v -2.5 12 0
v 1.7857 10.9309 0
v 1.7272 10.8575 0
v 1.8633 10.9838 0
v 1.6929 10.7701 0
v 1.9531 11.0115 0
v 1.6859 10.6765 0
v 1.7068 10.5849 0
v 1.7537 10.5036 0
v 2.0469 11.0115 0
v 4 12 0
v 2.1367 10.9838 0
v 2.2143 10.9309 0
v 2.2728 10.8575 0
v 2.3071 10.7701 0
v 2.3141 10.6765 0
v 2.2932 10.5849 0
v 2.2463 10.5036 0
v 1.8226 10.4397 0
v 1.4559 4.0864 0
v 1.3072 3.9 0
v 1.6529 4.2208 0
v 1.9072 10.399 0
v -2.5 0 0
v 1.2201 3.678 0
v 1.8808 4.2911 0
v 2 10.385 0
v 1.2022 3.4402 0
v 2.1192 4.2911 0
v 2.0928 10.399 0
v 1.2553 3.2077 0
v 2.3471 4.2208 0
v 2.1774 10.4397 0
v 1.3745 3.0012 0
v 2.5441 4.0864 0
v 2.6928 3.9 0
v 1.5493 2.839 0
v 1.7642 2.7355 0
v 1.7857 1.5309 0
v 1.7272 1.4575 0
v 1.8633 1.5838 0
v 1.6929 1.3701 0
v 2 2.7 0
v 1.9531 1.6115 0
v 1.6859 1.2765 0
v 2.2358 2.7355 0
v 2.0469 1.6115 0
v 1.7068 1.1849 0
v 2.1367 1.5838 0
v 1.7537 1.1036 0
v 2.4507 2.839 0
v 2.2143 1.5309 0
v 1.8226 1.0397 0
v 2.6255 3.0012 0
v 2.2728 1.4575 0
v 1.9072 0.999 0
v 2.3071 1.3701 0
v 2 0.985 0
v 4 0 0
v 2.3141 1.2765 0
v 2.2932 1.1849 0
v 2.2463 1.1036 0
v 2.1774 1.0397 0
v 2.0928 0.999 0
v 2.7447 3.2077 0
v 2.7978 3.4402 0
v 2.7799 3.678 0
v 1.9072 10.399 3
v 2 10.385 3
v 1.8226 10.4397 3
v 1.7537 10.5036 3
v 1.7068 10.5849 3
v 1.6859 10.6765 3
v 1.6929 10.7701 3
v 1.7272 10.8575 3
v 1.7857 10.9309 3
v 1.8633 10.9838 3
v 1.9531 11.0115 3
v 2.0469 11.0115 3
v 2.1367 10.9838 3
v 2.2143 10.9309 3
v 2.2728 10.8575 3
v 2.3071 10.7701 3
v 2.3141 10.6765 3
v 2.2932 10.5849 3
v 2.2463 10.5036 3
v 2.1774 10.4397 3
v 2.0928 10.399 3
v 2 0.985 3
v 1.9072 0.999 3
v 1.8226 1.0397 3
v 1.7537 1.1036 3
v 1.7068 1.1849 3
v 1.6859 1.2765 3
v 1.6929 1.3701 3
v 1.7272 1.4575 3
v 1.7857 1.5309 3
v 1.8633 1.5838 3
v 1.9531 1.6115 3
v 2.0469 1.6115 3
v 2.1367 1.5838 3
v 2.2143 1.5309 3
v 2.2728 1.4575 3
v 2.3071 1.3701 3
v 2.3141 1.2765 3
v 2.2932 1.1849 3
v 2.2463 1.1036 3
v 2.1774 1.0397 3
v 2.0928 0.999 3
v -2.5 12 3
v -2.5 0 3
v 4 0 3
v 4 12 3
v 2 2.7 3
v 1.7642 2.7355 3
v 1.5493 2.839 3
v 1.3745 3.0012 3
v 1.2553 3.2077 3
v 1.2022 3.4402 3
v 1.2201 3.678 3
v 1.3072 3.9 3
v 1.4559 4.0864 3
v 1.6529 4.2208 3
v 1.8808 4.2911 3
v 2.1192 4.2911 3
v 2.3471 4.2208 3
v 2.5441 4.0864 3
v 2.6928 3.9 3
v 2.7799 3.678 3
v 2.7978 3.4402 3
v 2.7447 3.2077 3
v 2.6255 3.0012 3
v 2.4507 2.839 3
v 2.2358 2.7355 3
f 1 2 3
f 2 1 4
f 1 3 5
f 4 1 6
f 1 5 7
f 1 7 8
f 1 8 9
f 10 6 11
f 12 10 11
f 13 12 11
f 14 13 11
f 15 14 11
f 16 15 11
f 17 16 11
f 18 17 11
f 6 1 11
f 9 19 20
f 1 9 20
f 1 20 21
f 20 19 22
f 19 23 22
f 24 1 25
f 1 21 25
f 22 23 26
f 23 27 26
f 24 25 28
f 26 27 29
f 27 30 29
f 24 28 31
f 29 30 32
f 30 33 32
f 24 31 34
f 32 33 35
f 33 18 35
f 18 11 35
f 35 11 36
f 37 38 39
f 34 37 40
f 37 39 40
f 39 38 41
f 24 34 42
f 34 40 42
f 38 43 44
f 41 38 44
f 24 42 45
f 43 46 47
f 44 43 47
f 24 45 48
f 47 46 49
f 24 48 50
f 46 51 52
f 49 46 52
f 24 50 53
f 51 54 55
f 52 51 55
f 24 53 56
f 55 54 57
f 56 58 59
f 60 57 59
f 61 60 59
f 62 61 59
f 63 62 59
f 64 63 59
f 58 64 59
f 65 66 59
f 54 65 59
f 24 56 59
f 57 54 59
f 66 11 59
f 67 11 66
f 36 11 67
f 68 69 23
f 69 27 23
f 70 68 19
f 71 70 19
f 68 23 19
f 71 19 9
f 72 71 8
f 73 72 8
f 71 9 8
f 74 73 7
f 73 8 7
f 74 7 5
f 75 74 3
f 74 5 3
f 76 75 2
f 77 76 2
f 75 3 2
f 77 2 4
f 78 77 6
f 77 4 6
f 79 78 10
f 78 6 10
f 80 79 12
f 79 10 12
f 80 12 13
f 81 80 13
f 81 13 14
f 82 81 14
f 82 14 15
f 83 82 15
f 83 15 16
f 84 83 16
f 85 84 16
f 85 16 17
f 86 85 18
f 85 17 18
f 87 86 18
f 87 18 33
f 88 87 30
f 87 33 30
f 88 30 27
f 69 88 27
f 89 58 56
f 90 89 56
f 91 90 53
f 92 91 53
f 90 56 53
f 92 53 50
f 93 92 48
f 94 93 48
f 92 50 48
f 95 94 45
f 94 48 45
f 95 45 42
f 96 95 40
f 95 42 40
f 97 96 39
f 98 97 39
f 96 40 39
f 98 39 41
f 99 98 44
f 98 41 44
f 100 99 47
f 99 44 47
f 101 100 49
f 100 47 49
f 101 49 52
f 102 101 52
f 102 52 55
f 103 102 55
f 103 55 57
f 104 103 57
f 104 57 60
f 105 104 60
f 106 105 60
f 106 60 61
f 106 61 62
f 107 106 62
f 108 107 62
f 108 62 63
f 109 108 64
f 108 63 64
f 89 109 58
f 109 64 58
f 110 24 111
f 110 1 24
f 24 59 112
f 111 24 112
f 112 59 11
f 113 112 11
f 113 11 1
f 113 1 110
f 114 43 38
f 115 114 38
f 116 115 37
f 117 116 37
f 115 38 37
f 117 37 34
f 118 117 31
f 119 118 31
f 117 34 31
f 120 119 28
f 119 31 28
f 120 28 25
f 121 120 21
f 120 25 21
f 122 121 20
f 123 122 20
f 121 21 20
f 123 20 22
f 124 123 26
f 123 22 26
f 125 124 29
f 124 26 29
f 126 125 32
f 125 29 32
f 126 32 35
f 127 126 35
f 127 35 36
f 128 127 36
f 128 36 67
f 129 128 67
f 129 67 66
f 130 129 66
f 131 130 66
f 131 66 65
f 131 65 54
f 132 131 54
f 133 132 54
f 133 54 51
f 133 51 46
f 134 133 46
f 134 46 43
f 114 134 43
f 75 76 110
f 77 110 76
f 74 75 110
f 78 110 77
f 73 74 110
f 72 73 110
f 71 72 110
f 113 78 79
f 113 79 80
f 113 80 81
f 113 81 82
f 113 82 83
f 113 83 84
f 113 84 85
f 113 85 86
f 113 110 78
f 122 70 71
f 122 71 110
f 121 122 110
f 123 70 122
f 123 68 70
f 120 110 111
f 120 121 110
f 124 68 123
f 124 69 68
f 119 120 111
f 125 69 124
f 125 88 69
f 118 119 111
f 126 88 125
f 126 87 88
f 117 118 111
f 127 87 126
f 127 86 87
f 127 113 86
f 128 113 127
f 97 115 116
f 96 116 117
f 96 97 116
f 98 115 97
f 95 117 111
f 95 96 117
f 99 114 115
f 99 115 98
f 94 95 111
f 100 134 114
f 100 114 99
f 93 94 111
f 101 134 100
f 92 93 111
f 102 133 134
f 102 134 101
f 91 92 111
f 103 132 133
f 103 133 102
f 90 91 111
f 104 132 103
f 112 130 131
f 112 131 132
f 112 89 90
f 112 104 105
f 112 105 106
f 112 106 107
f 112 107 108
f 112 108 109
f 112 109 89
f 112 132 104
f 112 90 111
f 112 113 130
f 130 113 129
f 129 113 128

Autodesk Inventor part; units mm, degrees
ref_plane "YZ Plane" through (0, 0, 0) normal (1, 0, 0) x (0, 1, 0)
ref_plane "XZ Plane" through (0, 0, 0) normal (0, 1, 0) x (-1, 0, 0)
ref_plane "XY Plane" through (0, 0, 0) normal (0, 0, 1) x (1, 0, 0)
sketch "스케치1" plane through (0, 0, 0) normal (0, 0, 1) x (1, 0, 0)
  line L0 (0, 0) -> (4, 0)
  line L1 (4, 0) -> (4, 12)
  line L2 (4, 12) -> (0, 12)
  line L3 (0, 12) -> (0, 0)
  dimension "d0" = 4
  dimension "d1" = 12
extrude "돌출1" add sketch "스케치1" along normal blind 3
sketch "스케치2" plane through (0, 0, 3) normal (0, 0, 1) x (1, 0, 0)
  line L0 (4, 12) -> (0, 12) construction
  line L1 (2, 12) -> (2, 0) construction
  line L2 (0, 0) -> (4, 0) construction
  line L3 (4, 0) -> (4, 12) projected
  line L4 (0, 12) -> (0, 0) projected
  point P0 (2, 7.7)
  point P1 (2, 3.5)
  point P2 (2, 1.3)
  point P3 (2, 10.7)
  dimension "d9" = 4.3
  dimension "d45" = 1.3
  dimension "d51" = 4.2
  dimension "d52" = 2.2
  dimension "d55" = 1.3
hole "구멍2" at (2, 3.5, 3) direction (0, 0, -1) diameter 1.6 end through all
hole "구멍3" at (2, 1.3, 3) at (2, 10.7, 3) direction (0, 0, -1) diameter 0.63 end through all
sketch "스케치4" plane through (0, 0, 0) normal (-1, 0, 0) x (0, 0, 1)
  line L0 (0, 12) -> (0, 0) projected
  line L1 (0, 0) -> (3, 0) projected
  line L2 (3, 12) -> (3, 0) projected
  line L3 (0, 12) -> (3, 12) projected
extrude "돌출4" add sketch "스케치4" along normal blind 2.5
equation "\"G23_M\" = 0.67"
equation "\"G23_F\" = 0.65"
properties part number "_3D 인쇄"
